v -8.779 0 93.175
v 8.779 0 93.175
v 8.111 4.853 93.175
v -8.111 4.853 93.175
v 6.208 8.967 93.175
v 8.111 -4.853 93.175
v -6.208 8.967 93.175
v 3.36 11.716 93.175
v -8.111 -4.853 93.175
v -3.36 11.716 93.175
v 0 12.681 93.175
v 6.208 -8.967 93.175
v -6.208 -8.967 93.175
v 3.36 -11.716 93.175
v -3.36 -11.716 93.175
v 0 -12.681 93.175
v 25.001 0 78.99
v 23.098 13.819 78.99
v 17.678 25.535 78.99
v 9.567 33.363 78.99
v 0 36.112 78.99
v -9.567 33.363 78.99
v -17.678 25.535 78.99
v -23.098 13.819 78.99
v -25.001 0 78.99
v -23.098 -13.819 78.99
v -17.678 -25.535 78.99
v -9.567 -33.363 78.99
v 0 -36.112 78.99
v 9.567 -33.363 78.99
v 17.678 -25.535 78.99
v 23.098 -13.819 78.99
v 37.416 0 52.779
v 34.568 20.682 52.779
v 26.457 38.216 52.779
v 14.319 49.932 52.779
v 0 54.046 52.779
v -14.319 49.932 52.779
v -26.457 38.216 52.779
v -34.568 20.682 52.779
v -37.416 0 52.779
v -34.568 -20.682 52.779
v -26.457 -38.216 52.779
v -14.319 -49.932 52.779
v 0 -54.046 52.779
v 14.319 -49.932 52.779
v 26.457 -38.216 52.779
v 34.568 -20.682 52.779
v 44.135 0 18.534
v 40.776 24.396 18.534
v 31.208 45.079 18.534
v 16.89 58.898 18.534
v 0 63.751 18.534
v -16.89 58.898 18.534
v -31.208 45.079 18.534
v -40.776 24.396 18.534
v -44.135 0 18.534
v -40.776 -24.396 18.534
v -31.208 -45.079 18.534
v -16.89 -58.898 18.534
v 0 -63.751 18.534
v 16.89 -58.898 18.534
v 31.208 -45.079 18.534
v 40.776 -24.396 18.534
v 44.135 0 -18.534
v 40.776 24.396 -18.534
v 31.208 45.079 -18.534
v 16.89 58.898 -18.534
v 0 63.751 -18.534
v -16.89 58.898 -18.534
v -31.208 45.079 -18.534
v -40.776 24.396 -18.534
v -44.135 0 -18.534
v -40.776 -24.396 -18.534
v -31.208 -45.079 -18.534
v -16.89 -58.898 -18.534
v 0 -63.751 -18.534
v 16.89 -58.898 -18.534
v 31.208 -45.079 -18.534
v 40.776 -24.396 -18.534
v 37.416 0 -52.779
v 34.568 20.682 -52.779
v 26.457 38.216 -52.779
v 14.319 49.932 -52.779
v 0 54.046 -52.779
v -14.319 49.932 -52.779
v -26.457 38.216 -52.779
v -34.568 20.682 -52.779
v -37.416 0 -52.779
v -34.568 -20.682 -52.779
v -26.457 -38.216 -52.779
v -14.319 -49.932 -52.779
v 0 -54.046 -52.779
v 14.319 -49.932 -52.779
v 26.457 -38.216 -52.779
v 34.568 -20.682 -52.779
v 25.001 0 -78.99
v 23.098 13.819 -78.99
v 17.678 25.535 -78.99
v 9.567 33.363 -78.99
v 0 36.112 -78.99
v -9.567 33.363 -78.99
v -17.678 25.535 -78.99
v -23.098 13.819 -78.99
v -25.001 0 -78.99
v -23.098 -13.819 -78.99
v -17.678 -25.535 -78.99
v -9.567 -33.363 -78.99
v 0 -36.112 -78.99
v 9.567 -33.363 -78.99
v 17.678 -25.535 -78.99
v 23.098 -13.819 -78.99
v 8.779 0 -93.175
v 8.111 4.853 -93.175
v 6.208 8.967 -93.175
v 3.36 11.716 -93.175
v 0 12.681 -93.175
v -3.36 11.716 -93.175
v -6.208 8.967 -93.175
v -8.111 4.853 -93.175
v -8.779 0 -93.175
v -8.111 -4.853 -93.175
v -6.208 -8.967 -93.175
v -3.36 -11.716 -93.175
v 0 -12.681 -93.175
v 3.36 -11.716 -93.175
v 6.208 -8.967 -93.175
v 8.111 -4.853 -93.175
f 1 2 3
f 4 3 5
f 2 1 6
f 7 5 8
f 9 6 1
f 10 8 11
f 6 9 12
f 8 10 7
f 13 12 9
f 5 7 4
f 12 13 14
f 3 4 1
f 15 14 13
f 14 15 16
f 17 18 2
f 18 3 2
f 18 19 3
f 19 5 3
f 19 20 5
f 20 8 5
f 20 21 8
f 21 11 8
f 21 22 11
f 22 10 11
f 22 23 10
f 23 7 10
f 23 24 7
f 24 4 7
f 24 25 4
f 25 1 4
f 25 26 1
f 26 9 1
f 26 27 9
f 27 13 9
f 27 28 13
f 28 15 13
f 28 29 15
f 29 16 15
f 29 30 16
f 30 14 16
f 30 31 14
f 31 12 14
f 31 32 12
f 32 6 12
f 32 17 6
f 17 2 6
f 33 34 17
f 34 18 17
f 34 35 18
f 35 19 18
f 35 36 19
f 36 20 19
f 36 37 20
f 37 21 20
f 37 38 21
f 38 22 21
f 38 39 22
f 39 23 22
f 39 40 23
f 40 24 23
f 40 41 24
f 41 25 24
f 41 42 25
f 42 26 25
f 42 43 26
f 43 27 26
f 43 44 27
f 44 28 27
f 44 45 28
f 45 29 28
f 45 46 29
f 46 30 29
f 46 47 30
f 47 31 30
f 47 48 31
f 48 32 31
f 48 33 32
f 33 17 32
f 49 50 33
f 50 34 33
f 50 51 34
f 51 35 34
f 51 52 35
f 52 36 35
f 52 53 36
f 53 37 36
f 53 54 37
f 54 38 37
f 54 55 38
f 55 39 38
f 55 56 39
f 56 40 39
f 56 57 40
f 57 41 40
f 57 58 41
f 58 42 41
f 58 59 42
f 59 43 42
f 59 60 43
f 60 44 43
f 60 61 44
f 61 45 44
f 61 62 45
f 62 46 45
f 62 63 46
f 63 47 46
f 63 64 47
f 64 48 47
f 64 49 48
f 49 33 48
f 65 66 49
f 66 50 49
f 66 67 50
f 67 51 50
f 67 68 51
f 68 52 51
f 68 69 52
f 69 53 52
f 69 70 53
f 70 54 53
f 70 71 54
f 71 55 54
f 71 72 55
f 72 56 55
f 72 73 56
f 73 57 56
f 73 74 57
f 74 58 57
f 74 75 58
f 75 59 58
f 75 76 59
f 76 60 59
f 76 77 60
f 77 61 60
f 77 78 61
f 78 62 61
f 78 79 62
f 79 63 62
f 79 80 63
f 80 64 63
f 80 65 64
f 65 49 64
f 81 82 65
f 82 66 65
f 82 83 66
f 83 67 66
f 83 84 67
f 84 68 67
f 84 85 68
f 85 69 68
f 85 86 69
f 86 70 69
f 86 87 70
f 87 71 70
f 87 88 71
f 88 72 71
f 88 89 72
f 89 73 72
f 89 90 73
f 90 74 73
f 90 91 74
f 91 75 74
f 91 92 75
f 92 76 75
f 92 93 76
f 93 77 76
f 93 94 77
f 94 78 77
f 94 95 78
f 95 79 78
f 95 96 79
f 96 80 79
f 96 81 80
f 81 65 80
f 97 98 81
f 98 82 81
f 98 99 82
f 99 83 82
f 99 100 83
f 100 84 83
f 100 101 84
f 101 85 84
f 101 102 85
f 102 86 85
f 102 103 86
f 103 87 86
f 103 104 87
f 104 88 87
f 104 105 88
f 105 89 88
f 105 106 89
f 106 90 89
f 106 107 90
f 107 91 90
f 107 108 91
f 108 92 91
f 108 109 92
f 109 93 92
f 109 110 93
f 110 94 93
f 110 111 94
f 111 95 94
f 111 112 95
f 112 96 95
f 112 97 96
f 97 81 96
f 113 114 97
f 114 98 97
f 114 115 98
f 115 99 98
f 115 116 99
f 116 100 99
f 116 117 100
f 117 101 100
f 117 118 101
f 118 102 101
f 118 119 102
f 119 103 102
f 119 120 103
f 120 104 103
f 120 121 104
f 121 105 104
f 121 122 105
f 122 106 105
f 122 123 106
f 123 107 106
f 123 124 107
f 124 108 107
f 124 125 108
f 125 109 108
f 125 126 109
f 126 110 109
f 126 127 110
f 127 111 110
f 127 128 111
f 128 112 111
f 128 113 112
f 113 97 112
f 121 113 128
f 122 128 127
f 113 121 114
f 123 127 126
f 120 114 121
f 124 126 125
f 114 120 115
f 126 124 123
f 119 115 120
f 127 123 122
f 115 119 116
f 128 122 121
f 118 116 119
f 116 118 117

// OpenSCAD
// Generated by SolidPython 1.0.1 on 2020-07-29 00:46:49


scale(v = [9, 13, 19]) {
	sphere(r = 5);
}
/***********************************************
*********      SolidPython code:      **********
************************************************
 
# import packages: SolidPython
from solid import *
from solid.utils import *
from itertools import chain, combinations, permutations


class Resize:

    def __init__(self, scad_file):
        self.scad_file = scad_file
        #self.scad_file = import_scad(scad_file)
        # cone/cylinder param:
        self.r1 = 0
        self.r2 = 0
        self.h = 0
        # rectangular prism param:
        self.w = 0
        self.l = 0
        # ellipse param:
        self.r = 0

    # import OpenScad code (file name corresponds to shape)


    # classify shape + parameters
    def assign(self, param1, param2, param3):
        if self.scad_file == 'cone.scad':
            self.r1 = param1
            self.r2 = param2
            self.h = param3
        elif self.scad_file == 'cylinder.scad':
            self.r1 = param1
            self.r2 = param2
            self.h = param3
        elif self.scad_file == 'rectangularPrism.scad':
            self.h = param1
            self.l = param2
            self.w = param3
        else:
            self.r = param1
            self.h = param2

    # resize parameters
    def iterate(self):
        x = range(3, 20, 2)
        i = 1
        if self.scad_file == 'cone.scad':
            tempList = list(permutations(x, 2))
            for temp in tempList:
                param1 = temp[0]
                param2 = temp[1]
                filepath = 'produced_scad_files/' + 'cone' + str(param1) + '_' + str(param2) + '_' + '.scad'
                scad_render_to_file(cylinder(h=param1, r1=param2, r2=0), filepath)

        elif self.scad_file == 'cylinder.scad':
            tempList = list(permutations(x, 3))
            for temp in tempList:
                param1 = temp[0]
                param2 = temp[1]
                filepath = 'produced_scad_files/' + 'cylinder' + str(param1) + '_' + str(param2) + '_' + '.scad'
                scad_render_to_file(cylinder(h=param1, r1=param2, r2=param2), filepath)

        elif self.scad_file == 'rectangularPrism.scad':
            tempList = list(permutations(x, 3))
            for temp in tempList:
                param1 = temp[0]
                param2 = temp[1]
                param3 = temp[2]
                filepath = 'produced_scad_files/' + 'rectangularPrism' + str(param1) + '_' + str(param2) + '_' + str(
                    param3) + '.scad'
                scad_render_to_file(cube(size=(param1, param2, param3)), filepath)

        elif self.scad_file == 'ellipse.scad':
            tempList = list(permutations(x, 4))
            for temp in tempList:
                param1 = temp[0]
                param2 = temp[1]
                param3 = temp[2]
                param4 = temp[3]
                filepath = 'produced_scad_files/' + 'ellipse' + str(param1) + '_' + str(param2) + '_' + str(param3) + '_' + str(param4) + '.scad'
                scad_render_to_file(scale([param1, param2, param3])(sphere(r=param4)), filepath)

    def render_to_scadfile(self):
        scad_render_to_file(scad, 'example.scad') 
 
************************************************/
